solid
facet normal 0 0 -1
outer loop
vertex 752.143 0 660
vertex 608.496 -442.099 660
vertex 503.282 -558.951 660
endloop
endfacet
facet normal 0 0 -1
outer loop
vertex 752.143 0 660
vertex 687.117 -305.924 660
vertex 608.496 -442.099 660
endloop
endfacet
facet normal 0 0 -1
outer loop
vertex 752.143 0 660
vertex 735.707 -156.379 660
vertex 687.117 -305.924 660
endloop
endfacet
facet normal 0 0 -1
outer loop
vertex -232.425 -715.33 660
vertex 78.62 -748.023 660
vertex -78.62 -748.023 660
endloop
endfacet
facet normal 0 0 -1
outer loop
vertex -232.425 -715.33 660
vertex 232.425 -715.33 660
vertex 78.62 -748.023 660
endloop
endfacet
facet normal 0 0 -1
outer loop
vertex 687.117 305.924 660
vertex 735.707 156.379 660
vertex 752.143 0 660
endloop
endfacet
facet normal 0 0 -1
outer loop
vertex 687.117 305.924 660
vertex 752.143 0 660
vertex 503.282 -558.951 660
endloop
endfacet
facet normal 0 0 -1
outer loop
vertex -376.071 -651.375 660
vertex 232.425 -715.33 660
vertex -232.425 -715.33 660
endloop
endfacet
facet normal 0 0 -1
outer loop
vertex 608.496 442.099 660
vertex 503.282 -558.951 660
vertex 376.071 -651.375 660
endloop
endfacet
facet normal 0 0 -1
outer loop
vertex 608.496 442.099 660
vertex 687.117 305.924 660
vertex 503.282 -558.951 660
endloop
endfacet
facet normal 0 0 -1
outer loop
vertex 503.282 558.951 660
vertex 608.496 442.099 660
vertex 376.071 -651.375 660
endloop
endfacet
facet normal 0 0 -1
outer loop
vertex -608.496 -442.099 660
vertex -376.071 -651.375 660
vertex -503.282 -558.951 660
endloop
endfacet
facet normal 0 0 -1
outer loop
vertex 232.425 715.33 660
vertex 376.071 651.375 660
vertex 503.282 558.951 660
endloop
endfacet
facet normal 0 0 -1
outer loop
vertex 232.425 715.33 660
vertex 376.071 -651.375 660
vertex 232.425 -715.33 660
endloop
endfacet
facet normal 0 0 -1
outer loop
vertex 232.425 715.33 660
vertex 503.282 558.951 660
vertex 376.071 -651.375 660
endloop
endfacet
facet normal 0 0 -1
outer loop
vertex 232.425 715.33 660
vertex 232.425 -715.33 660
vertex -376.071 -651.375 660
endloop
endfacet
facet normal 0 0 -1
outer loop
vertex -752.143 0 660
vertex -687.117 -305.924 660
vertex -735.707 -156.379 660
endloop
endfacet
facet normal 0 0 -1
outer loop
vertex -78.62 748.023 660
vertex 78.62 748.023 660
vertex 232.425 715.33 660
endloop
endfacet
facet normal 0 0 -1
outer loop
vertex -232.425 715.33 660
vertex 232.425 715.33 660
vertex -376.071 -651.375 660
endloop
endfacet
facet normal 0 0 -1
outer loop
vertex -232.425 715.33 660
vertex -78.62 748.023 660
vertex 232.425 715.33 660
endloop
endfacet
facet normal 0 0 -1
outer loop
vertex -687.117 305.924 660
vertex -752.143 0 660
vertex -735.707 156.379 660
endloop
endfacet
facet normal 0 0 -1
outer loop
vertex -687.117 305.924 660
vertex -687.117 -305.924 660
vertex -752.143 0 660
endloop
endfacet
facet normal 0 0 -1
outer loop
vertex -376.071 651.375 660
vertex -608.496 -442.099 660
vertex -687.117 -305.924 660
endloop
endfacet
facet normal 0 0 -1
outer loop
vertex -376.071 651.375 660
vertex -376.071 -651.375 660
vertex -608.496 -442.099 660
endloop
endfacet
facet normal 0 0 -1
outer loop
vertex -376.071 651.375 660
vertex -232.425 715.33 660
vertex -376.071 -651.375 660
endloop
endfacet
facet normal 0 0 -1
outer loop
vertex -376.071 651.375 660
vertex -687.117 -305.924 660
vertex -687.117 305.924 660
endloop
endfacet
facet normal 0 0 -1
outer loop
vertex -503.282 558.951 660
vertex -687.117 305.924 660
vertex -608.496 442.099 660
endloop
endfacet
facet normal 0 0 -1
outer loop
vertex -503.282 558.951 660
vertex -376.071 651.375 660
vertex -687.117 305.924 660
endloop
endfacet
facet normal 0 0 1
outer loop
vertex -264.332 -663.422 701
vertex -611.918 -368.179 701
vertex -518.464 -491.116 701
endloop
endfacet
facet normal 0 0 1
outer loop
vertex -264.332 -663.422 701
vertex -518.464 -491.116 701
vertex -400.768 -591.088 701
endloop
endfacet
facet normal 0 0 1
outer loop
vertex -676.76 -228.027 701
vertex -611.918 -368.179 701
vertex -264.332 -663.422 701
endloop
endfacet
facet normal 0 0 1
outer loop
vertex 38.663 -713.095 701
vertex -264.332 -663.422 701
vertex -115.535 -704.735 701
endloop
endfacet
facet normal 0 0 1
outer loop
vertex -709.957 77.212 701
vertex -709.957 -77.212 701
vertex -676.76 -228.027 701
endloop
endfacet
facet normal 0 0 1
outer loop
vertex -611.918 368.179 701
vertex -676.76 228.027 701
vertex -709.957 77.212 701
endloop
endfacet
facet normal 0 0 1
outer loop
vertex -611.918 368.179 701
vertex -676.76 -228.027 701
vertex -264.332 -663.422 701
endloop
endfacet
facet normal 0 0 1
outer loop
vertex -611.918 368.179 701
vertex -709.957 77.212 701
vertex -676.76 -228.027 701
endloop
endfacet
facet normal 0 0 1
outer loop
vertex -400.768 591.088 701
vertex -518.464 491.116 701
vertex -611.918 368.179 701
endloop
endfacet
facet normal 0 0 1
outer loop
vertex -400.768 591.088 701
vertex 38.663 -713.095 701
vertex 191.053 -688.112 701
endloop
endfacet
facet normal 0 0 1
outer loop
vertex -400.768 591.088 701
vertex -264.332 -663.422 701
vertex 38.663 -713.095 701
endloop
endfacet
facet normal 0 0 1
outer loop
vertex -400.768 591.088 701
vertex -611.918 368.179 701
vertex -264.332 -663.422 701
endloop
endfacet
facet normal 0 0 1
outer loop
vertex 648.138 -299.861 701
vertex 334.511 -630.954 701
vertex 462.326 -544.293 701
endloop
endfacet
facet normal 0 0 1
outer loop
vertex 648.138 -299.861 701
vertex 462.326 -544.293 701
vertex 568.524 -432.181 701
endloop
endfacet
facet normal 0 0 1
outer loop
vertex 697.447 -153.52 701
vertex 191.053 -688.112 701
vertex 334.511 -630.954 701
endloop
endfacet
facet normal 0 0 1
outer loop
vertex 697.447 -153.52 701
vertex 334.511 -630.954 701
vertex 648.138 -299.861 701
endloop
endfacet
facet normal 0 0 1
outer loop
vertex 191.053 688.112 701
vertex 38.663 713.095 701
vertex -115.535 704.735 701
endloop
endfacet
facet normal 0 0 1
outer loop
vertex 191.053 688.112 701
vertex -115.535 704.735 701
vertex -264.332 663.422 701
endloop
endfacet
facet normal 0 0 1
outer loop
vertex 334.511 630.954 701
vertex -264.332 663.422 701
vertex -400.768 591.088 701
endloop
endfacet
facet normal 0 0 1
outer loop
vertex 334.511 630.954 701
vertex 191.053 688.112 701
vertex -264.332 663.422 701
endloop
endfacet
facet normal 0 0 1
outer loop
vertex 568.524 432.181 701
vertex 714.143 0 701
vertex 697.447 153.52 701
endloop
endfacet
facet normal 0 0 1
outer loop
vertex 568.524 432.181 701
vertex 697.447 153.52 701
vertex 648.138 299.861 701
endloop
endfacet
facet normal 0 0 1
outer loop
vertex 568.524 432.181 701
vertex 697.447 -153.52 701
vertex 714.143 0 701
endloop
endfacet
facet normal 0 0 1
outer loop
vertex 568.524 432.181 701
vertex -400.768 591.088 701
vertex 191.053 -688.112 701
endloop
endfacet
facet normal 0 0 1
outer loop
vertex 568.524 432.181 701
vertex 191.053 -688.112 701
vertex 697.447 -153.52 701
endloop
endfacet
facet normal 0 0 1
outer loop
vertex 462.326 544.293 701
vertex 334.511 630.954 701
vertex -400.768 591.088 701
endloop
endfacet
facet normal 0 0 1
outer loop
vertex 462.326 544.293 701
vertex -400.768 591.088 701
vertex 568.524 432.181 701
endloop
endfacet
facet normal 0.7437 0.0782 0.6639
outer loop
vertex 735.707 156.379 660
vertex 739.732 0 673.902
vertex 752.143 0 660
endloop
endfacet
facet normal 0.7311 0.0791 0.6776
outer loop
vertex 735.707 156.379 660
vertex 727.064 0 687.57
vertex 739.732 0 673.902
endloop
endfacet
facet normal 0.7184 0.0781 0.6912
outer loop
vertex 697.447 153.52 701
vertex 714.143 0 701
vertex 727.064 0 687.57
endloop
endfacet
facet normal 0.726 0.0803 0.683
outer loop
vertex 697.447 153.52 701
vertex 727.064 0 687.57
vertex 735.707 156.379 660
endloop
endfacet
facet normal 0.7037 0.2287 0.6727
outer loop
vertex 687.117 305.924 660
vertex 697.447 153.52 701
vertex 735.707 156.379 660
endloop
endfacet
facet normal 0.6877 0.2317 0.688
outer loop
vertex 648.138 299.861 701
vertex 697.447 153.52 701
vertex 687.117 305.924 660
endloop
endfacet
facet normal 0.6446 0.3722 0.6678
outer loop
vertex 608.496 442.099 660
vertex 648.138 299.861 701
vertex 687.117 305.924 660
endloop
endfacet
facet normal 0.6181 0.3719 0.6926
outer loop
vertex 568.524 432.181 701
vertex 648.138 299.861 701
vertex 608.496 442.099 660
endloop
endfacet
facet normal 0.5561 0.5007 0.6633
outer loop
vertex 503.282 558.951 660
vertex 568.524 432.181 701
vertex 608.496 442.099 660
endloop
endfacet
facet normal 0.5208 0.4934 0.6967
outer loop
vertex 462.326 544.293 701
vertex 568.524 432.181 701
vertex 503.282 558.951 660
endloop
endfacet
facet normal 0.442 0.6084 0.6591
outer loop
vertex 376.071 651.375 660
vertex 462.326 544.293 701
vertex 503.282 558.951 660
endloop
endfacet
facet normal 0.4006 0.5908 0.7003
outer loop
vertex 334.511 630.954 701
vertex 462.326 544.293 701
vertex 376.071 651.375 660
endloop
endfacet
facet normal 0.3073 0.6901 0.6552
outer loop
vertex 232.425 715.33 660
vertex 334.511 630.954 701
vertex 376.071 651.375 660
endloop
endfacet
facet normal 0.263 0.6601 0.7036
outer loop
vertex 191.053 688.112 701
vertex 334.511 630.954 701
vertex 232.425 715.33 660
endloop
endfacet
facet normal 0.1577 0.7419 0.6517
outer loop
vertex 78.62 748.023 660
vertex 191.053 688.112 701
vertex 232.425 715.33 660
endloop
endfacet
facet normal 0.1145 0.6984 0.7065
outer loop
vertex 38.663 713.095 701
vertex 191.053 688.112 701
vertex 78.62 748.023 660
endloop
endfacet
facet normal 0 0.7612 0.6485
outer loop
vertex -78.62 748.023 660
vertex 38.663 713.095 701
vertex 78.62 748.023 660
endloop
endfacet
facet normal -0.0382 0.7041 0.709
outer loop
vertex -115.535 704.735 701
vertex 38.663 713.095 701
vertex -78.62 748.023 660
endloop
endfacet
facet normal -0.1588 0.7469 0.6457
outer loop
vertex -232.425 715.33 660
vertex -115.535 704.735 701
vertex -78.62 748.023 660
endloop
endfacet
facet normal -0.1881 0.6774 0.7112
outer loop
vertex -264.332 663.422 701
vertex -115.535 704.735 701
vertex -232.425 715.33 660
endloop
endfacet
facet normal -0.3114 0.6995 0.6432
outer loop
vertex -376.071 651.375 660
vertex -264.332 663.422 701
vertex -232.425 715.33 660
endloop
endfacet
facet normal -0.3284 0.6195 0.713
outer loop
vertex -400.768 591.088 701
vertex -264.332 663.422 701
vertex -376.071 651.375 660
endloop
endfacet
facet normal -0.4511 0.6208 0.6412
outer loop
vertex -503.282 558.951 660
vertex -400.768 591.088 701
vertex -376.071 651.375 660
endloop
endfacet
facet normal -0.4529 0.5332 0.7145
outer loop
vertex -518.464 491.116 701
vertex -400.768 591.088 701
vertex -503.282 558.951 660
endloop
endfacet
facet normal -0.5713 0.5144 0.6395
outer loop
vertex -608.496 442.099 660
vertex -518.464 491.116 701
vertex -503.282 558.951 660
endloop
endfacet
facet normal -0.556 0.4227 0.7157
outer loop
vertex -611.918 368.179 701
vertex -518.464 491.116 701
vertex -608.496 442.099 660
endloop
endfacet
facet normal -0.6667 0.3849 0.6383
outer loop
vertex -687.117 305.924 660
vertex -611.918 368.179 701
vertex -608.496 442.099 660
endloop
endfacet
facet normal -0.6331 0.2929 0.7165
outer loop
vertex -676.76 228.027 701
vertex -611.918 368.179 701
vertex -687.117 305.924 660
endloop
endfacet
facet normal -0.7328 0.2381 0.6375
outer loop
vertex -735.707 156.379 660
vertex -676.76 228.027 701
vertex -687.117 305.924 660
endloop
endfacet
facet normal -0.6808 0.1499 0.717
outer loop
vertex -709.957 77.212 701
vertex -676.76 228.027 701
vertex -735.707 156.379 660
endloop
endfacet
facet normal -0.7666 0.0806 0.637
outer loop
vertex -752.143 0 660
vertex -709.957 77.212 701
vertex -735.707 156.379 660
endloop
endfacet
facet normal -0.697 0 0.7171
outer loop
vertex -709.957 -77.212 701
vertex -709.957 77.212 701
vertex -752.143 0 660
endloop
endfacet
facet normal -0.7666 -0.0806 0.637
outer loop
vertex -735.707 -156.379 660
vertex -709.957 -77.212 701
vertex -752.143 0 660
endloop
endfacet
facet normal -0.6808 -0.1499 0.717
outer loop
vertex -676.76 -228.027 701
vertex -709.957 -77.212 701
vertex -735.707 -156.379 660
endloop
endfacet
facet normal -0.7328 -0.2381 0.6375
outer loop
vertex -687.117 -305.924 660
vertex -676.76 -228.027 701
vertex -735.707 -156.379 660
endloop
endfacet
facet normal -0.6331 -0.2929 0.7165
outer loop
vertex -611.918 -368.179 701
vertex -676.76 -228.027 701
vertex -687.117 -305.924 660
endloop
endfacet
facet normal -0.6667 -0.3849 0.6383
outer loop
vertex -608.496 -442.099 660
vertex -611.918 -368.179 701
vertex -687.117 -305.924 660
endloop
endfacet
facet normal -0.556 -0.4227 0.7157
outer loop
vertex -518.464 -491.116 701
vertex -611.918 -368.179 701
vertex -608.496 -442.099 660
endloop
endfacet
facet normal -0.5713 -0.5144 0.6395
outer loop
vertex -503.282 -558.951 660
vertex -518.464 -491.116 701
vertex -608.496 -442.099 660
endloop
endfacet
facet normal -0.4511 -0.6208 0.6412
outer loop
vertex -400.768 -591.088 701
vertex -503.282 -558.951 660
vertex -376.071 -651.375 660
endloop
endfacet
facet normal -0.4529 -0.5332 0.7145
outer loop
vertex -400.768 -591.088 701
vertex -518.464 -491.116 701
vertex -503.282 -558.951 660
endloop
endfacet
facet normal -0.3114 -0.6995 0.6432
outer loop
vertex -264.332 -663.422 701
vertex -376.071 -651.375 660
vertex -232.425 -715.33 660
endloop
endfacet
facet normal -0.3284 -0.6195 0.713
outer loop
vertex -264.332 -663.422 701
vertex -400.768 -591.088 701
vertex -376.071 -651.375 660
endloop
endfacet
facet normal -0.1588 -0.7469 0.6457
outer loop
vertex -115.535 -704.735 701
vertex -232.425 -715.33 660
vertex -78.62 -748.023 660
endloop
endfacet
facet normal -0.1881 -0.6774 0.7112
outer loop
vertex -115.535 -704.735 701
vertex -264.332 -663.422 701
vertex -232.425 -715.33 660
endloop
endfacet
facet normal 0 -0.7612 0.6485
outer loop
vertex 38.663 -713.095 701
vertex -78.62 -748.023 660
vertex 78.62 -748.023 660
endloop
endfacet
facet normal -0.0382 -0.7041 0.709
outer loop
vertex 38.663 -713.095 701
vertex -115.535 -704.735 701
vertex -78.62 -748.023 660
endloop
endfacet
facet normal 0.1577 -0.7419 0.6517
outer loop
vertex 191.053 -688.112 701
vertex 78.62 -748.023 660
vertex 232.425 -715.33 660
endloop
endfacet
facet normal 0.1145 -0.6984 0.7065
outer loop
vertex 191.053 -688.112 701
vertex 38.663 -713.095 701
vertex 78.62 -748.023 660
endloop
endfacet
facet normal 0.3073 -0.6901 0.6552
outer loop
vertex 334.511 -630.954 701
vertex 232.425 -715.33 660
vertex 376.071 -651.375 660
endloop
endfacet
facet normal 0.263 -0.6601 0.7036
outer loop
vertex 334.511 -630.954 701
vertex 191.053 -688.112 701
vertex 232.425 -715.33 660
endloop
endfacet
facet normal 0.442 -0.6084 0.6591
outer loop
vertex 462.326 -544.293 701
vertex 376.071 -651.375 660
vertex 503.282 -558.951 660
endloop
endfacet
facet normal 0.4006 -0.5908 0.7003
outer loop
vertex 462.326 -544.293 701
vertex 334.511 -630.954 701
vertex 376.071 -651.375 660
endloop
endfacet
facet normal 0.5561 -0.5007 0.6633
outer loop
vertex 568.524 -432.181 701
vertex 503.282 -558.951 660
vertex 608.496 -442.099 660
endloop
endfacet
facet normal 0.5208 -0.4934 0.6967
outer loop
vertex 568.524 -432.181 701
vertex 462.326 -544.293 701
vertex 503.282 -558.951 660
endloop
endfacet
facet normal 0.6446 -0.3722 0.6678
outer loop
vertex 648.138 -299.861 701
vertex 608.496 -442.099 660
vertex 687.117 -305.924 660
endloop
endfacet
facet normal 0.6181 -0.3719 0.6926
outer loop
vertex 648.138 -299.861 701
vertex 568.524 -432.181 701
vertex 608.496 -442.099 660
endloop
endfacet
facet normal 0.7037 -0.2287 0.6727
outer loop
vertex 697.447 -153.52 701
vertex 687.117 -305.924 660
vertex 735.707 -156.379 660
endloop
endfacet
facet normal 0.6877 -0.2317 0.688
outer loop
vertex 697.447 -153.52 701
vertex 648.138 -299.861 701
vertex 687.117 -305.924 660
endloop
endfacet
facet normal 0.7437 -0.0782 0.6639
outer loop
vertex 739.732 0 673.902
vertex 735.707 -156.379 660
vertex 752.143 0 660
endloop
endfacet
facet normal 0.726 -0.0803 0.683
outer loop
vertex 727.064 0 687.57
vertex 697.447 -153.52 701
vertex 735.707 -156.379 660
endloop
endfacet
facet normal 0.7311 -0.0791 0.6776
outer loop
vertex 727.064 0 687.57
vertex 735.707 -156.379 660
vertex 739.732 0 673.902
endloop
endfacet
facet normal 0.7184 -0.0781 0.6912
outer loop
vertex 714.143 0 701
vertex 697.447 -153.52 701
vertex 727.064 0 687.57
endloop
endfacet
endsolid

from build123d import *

# Parameters (mm, degrees)
SKETCH1_R           = 1000
BOSS_EXTRUDE2_DEPTH = 1
DOME1_FACE_RADIUS   = 1000
DOME1_HEIGHT        = 1000
CUT_EXTRUDE1_START  = -300
SKETCH2_R           = 1000
CUT_EXTRUDE1_DEPTH  = 300
SKETCH4_R           = 1000
CUT_EXTRUDE2_DEPTH  = 660


with BuildPart() as part:
    # Sketch1 → Boss-Extrude2 (new body)
    with BuildSketch(Plane.XY):
        Circle(SKETCH1_R)
    extrude(amount=BOSS_EXTRUDE2_DEPTH)

    # Dome1: a dome of height H over a round flat face of radius A is a cap of a sphere of radius (A * A + H * H) / (2 * H)
    dome1_r = (DOME1_FACE_RADIUS * DOME1_FACE_RADIUS + DOME1_HEIGHT * DOME1_HEIGHT) / (2 * DOME1_HEIGHT)
    dome1_base = Plane((0, 0, 1), z_dir=(0, 0, 1))
    with Locations(dome1_base.offset(DOME1_HEIGHT - dome1_r)):
        dome1_ball = Sphere(dome1_r, mode=Mode.PRIVATE)
    add(split(dome1_ball, bisect_by=dome1_base, keep=Keep.TOP, mode=Mode.PRIVATE))

    # Sketch2 → Cut-Extrude1 (cut)
    with BuildSketch(Plane.XY.offset(1001).offset(CUT_EXTRUDE1_START)):
        Circle(SKETCH2_R)
    extrude(amount=CUT_EXTRUDE1_DEPTH, mode=Mode.SUBTRACT)

    # Sketch4 → Cut-Extrude2 (cut)
    with BuildSketch(Plane(origin=(0, 0, 0), x_dir=(-1, 0, 0), z_dir=(0, 0, -1))):
        Circle(SKETCH4_R)
    extrude(amount=-CUT_EXTRUDE2_DEPTH, mode=Mode.SUBTRACT)


solid = part.part
